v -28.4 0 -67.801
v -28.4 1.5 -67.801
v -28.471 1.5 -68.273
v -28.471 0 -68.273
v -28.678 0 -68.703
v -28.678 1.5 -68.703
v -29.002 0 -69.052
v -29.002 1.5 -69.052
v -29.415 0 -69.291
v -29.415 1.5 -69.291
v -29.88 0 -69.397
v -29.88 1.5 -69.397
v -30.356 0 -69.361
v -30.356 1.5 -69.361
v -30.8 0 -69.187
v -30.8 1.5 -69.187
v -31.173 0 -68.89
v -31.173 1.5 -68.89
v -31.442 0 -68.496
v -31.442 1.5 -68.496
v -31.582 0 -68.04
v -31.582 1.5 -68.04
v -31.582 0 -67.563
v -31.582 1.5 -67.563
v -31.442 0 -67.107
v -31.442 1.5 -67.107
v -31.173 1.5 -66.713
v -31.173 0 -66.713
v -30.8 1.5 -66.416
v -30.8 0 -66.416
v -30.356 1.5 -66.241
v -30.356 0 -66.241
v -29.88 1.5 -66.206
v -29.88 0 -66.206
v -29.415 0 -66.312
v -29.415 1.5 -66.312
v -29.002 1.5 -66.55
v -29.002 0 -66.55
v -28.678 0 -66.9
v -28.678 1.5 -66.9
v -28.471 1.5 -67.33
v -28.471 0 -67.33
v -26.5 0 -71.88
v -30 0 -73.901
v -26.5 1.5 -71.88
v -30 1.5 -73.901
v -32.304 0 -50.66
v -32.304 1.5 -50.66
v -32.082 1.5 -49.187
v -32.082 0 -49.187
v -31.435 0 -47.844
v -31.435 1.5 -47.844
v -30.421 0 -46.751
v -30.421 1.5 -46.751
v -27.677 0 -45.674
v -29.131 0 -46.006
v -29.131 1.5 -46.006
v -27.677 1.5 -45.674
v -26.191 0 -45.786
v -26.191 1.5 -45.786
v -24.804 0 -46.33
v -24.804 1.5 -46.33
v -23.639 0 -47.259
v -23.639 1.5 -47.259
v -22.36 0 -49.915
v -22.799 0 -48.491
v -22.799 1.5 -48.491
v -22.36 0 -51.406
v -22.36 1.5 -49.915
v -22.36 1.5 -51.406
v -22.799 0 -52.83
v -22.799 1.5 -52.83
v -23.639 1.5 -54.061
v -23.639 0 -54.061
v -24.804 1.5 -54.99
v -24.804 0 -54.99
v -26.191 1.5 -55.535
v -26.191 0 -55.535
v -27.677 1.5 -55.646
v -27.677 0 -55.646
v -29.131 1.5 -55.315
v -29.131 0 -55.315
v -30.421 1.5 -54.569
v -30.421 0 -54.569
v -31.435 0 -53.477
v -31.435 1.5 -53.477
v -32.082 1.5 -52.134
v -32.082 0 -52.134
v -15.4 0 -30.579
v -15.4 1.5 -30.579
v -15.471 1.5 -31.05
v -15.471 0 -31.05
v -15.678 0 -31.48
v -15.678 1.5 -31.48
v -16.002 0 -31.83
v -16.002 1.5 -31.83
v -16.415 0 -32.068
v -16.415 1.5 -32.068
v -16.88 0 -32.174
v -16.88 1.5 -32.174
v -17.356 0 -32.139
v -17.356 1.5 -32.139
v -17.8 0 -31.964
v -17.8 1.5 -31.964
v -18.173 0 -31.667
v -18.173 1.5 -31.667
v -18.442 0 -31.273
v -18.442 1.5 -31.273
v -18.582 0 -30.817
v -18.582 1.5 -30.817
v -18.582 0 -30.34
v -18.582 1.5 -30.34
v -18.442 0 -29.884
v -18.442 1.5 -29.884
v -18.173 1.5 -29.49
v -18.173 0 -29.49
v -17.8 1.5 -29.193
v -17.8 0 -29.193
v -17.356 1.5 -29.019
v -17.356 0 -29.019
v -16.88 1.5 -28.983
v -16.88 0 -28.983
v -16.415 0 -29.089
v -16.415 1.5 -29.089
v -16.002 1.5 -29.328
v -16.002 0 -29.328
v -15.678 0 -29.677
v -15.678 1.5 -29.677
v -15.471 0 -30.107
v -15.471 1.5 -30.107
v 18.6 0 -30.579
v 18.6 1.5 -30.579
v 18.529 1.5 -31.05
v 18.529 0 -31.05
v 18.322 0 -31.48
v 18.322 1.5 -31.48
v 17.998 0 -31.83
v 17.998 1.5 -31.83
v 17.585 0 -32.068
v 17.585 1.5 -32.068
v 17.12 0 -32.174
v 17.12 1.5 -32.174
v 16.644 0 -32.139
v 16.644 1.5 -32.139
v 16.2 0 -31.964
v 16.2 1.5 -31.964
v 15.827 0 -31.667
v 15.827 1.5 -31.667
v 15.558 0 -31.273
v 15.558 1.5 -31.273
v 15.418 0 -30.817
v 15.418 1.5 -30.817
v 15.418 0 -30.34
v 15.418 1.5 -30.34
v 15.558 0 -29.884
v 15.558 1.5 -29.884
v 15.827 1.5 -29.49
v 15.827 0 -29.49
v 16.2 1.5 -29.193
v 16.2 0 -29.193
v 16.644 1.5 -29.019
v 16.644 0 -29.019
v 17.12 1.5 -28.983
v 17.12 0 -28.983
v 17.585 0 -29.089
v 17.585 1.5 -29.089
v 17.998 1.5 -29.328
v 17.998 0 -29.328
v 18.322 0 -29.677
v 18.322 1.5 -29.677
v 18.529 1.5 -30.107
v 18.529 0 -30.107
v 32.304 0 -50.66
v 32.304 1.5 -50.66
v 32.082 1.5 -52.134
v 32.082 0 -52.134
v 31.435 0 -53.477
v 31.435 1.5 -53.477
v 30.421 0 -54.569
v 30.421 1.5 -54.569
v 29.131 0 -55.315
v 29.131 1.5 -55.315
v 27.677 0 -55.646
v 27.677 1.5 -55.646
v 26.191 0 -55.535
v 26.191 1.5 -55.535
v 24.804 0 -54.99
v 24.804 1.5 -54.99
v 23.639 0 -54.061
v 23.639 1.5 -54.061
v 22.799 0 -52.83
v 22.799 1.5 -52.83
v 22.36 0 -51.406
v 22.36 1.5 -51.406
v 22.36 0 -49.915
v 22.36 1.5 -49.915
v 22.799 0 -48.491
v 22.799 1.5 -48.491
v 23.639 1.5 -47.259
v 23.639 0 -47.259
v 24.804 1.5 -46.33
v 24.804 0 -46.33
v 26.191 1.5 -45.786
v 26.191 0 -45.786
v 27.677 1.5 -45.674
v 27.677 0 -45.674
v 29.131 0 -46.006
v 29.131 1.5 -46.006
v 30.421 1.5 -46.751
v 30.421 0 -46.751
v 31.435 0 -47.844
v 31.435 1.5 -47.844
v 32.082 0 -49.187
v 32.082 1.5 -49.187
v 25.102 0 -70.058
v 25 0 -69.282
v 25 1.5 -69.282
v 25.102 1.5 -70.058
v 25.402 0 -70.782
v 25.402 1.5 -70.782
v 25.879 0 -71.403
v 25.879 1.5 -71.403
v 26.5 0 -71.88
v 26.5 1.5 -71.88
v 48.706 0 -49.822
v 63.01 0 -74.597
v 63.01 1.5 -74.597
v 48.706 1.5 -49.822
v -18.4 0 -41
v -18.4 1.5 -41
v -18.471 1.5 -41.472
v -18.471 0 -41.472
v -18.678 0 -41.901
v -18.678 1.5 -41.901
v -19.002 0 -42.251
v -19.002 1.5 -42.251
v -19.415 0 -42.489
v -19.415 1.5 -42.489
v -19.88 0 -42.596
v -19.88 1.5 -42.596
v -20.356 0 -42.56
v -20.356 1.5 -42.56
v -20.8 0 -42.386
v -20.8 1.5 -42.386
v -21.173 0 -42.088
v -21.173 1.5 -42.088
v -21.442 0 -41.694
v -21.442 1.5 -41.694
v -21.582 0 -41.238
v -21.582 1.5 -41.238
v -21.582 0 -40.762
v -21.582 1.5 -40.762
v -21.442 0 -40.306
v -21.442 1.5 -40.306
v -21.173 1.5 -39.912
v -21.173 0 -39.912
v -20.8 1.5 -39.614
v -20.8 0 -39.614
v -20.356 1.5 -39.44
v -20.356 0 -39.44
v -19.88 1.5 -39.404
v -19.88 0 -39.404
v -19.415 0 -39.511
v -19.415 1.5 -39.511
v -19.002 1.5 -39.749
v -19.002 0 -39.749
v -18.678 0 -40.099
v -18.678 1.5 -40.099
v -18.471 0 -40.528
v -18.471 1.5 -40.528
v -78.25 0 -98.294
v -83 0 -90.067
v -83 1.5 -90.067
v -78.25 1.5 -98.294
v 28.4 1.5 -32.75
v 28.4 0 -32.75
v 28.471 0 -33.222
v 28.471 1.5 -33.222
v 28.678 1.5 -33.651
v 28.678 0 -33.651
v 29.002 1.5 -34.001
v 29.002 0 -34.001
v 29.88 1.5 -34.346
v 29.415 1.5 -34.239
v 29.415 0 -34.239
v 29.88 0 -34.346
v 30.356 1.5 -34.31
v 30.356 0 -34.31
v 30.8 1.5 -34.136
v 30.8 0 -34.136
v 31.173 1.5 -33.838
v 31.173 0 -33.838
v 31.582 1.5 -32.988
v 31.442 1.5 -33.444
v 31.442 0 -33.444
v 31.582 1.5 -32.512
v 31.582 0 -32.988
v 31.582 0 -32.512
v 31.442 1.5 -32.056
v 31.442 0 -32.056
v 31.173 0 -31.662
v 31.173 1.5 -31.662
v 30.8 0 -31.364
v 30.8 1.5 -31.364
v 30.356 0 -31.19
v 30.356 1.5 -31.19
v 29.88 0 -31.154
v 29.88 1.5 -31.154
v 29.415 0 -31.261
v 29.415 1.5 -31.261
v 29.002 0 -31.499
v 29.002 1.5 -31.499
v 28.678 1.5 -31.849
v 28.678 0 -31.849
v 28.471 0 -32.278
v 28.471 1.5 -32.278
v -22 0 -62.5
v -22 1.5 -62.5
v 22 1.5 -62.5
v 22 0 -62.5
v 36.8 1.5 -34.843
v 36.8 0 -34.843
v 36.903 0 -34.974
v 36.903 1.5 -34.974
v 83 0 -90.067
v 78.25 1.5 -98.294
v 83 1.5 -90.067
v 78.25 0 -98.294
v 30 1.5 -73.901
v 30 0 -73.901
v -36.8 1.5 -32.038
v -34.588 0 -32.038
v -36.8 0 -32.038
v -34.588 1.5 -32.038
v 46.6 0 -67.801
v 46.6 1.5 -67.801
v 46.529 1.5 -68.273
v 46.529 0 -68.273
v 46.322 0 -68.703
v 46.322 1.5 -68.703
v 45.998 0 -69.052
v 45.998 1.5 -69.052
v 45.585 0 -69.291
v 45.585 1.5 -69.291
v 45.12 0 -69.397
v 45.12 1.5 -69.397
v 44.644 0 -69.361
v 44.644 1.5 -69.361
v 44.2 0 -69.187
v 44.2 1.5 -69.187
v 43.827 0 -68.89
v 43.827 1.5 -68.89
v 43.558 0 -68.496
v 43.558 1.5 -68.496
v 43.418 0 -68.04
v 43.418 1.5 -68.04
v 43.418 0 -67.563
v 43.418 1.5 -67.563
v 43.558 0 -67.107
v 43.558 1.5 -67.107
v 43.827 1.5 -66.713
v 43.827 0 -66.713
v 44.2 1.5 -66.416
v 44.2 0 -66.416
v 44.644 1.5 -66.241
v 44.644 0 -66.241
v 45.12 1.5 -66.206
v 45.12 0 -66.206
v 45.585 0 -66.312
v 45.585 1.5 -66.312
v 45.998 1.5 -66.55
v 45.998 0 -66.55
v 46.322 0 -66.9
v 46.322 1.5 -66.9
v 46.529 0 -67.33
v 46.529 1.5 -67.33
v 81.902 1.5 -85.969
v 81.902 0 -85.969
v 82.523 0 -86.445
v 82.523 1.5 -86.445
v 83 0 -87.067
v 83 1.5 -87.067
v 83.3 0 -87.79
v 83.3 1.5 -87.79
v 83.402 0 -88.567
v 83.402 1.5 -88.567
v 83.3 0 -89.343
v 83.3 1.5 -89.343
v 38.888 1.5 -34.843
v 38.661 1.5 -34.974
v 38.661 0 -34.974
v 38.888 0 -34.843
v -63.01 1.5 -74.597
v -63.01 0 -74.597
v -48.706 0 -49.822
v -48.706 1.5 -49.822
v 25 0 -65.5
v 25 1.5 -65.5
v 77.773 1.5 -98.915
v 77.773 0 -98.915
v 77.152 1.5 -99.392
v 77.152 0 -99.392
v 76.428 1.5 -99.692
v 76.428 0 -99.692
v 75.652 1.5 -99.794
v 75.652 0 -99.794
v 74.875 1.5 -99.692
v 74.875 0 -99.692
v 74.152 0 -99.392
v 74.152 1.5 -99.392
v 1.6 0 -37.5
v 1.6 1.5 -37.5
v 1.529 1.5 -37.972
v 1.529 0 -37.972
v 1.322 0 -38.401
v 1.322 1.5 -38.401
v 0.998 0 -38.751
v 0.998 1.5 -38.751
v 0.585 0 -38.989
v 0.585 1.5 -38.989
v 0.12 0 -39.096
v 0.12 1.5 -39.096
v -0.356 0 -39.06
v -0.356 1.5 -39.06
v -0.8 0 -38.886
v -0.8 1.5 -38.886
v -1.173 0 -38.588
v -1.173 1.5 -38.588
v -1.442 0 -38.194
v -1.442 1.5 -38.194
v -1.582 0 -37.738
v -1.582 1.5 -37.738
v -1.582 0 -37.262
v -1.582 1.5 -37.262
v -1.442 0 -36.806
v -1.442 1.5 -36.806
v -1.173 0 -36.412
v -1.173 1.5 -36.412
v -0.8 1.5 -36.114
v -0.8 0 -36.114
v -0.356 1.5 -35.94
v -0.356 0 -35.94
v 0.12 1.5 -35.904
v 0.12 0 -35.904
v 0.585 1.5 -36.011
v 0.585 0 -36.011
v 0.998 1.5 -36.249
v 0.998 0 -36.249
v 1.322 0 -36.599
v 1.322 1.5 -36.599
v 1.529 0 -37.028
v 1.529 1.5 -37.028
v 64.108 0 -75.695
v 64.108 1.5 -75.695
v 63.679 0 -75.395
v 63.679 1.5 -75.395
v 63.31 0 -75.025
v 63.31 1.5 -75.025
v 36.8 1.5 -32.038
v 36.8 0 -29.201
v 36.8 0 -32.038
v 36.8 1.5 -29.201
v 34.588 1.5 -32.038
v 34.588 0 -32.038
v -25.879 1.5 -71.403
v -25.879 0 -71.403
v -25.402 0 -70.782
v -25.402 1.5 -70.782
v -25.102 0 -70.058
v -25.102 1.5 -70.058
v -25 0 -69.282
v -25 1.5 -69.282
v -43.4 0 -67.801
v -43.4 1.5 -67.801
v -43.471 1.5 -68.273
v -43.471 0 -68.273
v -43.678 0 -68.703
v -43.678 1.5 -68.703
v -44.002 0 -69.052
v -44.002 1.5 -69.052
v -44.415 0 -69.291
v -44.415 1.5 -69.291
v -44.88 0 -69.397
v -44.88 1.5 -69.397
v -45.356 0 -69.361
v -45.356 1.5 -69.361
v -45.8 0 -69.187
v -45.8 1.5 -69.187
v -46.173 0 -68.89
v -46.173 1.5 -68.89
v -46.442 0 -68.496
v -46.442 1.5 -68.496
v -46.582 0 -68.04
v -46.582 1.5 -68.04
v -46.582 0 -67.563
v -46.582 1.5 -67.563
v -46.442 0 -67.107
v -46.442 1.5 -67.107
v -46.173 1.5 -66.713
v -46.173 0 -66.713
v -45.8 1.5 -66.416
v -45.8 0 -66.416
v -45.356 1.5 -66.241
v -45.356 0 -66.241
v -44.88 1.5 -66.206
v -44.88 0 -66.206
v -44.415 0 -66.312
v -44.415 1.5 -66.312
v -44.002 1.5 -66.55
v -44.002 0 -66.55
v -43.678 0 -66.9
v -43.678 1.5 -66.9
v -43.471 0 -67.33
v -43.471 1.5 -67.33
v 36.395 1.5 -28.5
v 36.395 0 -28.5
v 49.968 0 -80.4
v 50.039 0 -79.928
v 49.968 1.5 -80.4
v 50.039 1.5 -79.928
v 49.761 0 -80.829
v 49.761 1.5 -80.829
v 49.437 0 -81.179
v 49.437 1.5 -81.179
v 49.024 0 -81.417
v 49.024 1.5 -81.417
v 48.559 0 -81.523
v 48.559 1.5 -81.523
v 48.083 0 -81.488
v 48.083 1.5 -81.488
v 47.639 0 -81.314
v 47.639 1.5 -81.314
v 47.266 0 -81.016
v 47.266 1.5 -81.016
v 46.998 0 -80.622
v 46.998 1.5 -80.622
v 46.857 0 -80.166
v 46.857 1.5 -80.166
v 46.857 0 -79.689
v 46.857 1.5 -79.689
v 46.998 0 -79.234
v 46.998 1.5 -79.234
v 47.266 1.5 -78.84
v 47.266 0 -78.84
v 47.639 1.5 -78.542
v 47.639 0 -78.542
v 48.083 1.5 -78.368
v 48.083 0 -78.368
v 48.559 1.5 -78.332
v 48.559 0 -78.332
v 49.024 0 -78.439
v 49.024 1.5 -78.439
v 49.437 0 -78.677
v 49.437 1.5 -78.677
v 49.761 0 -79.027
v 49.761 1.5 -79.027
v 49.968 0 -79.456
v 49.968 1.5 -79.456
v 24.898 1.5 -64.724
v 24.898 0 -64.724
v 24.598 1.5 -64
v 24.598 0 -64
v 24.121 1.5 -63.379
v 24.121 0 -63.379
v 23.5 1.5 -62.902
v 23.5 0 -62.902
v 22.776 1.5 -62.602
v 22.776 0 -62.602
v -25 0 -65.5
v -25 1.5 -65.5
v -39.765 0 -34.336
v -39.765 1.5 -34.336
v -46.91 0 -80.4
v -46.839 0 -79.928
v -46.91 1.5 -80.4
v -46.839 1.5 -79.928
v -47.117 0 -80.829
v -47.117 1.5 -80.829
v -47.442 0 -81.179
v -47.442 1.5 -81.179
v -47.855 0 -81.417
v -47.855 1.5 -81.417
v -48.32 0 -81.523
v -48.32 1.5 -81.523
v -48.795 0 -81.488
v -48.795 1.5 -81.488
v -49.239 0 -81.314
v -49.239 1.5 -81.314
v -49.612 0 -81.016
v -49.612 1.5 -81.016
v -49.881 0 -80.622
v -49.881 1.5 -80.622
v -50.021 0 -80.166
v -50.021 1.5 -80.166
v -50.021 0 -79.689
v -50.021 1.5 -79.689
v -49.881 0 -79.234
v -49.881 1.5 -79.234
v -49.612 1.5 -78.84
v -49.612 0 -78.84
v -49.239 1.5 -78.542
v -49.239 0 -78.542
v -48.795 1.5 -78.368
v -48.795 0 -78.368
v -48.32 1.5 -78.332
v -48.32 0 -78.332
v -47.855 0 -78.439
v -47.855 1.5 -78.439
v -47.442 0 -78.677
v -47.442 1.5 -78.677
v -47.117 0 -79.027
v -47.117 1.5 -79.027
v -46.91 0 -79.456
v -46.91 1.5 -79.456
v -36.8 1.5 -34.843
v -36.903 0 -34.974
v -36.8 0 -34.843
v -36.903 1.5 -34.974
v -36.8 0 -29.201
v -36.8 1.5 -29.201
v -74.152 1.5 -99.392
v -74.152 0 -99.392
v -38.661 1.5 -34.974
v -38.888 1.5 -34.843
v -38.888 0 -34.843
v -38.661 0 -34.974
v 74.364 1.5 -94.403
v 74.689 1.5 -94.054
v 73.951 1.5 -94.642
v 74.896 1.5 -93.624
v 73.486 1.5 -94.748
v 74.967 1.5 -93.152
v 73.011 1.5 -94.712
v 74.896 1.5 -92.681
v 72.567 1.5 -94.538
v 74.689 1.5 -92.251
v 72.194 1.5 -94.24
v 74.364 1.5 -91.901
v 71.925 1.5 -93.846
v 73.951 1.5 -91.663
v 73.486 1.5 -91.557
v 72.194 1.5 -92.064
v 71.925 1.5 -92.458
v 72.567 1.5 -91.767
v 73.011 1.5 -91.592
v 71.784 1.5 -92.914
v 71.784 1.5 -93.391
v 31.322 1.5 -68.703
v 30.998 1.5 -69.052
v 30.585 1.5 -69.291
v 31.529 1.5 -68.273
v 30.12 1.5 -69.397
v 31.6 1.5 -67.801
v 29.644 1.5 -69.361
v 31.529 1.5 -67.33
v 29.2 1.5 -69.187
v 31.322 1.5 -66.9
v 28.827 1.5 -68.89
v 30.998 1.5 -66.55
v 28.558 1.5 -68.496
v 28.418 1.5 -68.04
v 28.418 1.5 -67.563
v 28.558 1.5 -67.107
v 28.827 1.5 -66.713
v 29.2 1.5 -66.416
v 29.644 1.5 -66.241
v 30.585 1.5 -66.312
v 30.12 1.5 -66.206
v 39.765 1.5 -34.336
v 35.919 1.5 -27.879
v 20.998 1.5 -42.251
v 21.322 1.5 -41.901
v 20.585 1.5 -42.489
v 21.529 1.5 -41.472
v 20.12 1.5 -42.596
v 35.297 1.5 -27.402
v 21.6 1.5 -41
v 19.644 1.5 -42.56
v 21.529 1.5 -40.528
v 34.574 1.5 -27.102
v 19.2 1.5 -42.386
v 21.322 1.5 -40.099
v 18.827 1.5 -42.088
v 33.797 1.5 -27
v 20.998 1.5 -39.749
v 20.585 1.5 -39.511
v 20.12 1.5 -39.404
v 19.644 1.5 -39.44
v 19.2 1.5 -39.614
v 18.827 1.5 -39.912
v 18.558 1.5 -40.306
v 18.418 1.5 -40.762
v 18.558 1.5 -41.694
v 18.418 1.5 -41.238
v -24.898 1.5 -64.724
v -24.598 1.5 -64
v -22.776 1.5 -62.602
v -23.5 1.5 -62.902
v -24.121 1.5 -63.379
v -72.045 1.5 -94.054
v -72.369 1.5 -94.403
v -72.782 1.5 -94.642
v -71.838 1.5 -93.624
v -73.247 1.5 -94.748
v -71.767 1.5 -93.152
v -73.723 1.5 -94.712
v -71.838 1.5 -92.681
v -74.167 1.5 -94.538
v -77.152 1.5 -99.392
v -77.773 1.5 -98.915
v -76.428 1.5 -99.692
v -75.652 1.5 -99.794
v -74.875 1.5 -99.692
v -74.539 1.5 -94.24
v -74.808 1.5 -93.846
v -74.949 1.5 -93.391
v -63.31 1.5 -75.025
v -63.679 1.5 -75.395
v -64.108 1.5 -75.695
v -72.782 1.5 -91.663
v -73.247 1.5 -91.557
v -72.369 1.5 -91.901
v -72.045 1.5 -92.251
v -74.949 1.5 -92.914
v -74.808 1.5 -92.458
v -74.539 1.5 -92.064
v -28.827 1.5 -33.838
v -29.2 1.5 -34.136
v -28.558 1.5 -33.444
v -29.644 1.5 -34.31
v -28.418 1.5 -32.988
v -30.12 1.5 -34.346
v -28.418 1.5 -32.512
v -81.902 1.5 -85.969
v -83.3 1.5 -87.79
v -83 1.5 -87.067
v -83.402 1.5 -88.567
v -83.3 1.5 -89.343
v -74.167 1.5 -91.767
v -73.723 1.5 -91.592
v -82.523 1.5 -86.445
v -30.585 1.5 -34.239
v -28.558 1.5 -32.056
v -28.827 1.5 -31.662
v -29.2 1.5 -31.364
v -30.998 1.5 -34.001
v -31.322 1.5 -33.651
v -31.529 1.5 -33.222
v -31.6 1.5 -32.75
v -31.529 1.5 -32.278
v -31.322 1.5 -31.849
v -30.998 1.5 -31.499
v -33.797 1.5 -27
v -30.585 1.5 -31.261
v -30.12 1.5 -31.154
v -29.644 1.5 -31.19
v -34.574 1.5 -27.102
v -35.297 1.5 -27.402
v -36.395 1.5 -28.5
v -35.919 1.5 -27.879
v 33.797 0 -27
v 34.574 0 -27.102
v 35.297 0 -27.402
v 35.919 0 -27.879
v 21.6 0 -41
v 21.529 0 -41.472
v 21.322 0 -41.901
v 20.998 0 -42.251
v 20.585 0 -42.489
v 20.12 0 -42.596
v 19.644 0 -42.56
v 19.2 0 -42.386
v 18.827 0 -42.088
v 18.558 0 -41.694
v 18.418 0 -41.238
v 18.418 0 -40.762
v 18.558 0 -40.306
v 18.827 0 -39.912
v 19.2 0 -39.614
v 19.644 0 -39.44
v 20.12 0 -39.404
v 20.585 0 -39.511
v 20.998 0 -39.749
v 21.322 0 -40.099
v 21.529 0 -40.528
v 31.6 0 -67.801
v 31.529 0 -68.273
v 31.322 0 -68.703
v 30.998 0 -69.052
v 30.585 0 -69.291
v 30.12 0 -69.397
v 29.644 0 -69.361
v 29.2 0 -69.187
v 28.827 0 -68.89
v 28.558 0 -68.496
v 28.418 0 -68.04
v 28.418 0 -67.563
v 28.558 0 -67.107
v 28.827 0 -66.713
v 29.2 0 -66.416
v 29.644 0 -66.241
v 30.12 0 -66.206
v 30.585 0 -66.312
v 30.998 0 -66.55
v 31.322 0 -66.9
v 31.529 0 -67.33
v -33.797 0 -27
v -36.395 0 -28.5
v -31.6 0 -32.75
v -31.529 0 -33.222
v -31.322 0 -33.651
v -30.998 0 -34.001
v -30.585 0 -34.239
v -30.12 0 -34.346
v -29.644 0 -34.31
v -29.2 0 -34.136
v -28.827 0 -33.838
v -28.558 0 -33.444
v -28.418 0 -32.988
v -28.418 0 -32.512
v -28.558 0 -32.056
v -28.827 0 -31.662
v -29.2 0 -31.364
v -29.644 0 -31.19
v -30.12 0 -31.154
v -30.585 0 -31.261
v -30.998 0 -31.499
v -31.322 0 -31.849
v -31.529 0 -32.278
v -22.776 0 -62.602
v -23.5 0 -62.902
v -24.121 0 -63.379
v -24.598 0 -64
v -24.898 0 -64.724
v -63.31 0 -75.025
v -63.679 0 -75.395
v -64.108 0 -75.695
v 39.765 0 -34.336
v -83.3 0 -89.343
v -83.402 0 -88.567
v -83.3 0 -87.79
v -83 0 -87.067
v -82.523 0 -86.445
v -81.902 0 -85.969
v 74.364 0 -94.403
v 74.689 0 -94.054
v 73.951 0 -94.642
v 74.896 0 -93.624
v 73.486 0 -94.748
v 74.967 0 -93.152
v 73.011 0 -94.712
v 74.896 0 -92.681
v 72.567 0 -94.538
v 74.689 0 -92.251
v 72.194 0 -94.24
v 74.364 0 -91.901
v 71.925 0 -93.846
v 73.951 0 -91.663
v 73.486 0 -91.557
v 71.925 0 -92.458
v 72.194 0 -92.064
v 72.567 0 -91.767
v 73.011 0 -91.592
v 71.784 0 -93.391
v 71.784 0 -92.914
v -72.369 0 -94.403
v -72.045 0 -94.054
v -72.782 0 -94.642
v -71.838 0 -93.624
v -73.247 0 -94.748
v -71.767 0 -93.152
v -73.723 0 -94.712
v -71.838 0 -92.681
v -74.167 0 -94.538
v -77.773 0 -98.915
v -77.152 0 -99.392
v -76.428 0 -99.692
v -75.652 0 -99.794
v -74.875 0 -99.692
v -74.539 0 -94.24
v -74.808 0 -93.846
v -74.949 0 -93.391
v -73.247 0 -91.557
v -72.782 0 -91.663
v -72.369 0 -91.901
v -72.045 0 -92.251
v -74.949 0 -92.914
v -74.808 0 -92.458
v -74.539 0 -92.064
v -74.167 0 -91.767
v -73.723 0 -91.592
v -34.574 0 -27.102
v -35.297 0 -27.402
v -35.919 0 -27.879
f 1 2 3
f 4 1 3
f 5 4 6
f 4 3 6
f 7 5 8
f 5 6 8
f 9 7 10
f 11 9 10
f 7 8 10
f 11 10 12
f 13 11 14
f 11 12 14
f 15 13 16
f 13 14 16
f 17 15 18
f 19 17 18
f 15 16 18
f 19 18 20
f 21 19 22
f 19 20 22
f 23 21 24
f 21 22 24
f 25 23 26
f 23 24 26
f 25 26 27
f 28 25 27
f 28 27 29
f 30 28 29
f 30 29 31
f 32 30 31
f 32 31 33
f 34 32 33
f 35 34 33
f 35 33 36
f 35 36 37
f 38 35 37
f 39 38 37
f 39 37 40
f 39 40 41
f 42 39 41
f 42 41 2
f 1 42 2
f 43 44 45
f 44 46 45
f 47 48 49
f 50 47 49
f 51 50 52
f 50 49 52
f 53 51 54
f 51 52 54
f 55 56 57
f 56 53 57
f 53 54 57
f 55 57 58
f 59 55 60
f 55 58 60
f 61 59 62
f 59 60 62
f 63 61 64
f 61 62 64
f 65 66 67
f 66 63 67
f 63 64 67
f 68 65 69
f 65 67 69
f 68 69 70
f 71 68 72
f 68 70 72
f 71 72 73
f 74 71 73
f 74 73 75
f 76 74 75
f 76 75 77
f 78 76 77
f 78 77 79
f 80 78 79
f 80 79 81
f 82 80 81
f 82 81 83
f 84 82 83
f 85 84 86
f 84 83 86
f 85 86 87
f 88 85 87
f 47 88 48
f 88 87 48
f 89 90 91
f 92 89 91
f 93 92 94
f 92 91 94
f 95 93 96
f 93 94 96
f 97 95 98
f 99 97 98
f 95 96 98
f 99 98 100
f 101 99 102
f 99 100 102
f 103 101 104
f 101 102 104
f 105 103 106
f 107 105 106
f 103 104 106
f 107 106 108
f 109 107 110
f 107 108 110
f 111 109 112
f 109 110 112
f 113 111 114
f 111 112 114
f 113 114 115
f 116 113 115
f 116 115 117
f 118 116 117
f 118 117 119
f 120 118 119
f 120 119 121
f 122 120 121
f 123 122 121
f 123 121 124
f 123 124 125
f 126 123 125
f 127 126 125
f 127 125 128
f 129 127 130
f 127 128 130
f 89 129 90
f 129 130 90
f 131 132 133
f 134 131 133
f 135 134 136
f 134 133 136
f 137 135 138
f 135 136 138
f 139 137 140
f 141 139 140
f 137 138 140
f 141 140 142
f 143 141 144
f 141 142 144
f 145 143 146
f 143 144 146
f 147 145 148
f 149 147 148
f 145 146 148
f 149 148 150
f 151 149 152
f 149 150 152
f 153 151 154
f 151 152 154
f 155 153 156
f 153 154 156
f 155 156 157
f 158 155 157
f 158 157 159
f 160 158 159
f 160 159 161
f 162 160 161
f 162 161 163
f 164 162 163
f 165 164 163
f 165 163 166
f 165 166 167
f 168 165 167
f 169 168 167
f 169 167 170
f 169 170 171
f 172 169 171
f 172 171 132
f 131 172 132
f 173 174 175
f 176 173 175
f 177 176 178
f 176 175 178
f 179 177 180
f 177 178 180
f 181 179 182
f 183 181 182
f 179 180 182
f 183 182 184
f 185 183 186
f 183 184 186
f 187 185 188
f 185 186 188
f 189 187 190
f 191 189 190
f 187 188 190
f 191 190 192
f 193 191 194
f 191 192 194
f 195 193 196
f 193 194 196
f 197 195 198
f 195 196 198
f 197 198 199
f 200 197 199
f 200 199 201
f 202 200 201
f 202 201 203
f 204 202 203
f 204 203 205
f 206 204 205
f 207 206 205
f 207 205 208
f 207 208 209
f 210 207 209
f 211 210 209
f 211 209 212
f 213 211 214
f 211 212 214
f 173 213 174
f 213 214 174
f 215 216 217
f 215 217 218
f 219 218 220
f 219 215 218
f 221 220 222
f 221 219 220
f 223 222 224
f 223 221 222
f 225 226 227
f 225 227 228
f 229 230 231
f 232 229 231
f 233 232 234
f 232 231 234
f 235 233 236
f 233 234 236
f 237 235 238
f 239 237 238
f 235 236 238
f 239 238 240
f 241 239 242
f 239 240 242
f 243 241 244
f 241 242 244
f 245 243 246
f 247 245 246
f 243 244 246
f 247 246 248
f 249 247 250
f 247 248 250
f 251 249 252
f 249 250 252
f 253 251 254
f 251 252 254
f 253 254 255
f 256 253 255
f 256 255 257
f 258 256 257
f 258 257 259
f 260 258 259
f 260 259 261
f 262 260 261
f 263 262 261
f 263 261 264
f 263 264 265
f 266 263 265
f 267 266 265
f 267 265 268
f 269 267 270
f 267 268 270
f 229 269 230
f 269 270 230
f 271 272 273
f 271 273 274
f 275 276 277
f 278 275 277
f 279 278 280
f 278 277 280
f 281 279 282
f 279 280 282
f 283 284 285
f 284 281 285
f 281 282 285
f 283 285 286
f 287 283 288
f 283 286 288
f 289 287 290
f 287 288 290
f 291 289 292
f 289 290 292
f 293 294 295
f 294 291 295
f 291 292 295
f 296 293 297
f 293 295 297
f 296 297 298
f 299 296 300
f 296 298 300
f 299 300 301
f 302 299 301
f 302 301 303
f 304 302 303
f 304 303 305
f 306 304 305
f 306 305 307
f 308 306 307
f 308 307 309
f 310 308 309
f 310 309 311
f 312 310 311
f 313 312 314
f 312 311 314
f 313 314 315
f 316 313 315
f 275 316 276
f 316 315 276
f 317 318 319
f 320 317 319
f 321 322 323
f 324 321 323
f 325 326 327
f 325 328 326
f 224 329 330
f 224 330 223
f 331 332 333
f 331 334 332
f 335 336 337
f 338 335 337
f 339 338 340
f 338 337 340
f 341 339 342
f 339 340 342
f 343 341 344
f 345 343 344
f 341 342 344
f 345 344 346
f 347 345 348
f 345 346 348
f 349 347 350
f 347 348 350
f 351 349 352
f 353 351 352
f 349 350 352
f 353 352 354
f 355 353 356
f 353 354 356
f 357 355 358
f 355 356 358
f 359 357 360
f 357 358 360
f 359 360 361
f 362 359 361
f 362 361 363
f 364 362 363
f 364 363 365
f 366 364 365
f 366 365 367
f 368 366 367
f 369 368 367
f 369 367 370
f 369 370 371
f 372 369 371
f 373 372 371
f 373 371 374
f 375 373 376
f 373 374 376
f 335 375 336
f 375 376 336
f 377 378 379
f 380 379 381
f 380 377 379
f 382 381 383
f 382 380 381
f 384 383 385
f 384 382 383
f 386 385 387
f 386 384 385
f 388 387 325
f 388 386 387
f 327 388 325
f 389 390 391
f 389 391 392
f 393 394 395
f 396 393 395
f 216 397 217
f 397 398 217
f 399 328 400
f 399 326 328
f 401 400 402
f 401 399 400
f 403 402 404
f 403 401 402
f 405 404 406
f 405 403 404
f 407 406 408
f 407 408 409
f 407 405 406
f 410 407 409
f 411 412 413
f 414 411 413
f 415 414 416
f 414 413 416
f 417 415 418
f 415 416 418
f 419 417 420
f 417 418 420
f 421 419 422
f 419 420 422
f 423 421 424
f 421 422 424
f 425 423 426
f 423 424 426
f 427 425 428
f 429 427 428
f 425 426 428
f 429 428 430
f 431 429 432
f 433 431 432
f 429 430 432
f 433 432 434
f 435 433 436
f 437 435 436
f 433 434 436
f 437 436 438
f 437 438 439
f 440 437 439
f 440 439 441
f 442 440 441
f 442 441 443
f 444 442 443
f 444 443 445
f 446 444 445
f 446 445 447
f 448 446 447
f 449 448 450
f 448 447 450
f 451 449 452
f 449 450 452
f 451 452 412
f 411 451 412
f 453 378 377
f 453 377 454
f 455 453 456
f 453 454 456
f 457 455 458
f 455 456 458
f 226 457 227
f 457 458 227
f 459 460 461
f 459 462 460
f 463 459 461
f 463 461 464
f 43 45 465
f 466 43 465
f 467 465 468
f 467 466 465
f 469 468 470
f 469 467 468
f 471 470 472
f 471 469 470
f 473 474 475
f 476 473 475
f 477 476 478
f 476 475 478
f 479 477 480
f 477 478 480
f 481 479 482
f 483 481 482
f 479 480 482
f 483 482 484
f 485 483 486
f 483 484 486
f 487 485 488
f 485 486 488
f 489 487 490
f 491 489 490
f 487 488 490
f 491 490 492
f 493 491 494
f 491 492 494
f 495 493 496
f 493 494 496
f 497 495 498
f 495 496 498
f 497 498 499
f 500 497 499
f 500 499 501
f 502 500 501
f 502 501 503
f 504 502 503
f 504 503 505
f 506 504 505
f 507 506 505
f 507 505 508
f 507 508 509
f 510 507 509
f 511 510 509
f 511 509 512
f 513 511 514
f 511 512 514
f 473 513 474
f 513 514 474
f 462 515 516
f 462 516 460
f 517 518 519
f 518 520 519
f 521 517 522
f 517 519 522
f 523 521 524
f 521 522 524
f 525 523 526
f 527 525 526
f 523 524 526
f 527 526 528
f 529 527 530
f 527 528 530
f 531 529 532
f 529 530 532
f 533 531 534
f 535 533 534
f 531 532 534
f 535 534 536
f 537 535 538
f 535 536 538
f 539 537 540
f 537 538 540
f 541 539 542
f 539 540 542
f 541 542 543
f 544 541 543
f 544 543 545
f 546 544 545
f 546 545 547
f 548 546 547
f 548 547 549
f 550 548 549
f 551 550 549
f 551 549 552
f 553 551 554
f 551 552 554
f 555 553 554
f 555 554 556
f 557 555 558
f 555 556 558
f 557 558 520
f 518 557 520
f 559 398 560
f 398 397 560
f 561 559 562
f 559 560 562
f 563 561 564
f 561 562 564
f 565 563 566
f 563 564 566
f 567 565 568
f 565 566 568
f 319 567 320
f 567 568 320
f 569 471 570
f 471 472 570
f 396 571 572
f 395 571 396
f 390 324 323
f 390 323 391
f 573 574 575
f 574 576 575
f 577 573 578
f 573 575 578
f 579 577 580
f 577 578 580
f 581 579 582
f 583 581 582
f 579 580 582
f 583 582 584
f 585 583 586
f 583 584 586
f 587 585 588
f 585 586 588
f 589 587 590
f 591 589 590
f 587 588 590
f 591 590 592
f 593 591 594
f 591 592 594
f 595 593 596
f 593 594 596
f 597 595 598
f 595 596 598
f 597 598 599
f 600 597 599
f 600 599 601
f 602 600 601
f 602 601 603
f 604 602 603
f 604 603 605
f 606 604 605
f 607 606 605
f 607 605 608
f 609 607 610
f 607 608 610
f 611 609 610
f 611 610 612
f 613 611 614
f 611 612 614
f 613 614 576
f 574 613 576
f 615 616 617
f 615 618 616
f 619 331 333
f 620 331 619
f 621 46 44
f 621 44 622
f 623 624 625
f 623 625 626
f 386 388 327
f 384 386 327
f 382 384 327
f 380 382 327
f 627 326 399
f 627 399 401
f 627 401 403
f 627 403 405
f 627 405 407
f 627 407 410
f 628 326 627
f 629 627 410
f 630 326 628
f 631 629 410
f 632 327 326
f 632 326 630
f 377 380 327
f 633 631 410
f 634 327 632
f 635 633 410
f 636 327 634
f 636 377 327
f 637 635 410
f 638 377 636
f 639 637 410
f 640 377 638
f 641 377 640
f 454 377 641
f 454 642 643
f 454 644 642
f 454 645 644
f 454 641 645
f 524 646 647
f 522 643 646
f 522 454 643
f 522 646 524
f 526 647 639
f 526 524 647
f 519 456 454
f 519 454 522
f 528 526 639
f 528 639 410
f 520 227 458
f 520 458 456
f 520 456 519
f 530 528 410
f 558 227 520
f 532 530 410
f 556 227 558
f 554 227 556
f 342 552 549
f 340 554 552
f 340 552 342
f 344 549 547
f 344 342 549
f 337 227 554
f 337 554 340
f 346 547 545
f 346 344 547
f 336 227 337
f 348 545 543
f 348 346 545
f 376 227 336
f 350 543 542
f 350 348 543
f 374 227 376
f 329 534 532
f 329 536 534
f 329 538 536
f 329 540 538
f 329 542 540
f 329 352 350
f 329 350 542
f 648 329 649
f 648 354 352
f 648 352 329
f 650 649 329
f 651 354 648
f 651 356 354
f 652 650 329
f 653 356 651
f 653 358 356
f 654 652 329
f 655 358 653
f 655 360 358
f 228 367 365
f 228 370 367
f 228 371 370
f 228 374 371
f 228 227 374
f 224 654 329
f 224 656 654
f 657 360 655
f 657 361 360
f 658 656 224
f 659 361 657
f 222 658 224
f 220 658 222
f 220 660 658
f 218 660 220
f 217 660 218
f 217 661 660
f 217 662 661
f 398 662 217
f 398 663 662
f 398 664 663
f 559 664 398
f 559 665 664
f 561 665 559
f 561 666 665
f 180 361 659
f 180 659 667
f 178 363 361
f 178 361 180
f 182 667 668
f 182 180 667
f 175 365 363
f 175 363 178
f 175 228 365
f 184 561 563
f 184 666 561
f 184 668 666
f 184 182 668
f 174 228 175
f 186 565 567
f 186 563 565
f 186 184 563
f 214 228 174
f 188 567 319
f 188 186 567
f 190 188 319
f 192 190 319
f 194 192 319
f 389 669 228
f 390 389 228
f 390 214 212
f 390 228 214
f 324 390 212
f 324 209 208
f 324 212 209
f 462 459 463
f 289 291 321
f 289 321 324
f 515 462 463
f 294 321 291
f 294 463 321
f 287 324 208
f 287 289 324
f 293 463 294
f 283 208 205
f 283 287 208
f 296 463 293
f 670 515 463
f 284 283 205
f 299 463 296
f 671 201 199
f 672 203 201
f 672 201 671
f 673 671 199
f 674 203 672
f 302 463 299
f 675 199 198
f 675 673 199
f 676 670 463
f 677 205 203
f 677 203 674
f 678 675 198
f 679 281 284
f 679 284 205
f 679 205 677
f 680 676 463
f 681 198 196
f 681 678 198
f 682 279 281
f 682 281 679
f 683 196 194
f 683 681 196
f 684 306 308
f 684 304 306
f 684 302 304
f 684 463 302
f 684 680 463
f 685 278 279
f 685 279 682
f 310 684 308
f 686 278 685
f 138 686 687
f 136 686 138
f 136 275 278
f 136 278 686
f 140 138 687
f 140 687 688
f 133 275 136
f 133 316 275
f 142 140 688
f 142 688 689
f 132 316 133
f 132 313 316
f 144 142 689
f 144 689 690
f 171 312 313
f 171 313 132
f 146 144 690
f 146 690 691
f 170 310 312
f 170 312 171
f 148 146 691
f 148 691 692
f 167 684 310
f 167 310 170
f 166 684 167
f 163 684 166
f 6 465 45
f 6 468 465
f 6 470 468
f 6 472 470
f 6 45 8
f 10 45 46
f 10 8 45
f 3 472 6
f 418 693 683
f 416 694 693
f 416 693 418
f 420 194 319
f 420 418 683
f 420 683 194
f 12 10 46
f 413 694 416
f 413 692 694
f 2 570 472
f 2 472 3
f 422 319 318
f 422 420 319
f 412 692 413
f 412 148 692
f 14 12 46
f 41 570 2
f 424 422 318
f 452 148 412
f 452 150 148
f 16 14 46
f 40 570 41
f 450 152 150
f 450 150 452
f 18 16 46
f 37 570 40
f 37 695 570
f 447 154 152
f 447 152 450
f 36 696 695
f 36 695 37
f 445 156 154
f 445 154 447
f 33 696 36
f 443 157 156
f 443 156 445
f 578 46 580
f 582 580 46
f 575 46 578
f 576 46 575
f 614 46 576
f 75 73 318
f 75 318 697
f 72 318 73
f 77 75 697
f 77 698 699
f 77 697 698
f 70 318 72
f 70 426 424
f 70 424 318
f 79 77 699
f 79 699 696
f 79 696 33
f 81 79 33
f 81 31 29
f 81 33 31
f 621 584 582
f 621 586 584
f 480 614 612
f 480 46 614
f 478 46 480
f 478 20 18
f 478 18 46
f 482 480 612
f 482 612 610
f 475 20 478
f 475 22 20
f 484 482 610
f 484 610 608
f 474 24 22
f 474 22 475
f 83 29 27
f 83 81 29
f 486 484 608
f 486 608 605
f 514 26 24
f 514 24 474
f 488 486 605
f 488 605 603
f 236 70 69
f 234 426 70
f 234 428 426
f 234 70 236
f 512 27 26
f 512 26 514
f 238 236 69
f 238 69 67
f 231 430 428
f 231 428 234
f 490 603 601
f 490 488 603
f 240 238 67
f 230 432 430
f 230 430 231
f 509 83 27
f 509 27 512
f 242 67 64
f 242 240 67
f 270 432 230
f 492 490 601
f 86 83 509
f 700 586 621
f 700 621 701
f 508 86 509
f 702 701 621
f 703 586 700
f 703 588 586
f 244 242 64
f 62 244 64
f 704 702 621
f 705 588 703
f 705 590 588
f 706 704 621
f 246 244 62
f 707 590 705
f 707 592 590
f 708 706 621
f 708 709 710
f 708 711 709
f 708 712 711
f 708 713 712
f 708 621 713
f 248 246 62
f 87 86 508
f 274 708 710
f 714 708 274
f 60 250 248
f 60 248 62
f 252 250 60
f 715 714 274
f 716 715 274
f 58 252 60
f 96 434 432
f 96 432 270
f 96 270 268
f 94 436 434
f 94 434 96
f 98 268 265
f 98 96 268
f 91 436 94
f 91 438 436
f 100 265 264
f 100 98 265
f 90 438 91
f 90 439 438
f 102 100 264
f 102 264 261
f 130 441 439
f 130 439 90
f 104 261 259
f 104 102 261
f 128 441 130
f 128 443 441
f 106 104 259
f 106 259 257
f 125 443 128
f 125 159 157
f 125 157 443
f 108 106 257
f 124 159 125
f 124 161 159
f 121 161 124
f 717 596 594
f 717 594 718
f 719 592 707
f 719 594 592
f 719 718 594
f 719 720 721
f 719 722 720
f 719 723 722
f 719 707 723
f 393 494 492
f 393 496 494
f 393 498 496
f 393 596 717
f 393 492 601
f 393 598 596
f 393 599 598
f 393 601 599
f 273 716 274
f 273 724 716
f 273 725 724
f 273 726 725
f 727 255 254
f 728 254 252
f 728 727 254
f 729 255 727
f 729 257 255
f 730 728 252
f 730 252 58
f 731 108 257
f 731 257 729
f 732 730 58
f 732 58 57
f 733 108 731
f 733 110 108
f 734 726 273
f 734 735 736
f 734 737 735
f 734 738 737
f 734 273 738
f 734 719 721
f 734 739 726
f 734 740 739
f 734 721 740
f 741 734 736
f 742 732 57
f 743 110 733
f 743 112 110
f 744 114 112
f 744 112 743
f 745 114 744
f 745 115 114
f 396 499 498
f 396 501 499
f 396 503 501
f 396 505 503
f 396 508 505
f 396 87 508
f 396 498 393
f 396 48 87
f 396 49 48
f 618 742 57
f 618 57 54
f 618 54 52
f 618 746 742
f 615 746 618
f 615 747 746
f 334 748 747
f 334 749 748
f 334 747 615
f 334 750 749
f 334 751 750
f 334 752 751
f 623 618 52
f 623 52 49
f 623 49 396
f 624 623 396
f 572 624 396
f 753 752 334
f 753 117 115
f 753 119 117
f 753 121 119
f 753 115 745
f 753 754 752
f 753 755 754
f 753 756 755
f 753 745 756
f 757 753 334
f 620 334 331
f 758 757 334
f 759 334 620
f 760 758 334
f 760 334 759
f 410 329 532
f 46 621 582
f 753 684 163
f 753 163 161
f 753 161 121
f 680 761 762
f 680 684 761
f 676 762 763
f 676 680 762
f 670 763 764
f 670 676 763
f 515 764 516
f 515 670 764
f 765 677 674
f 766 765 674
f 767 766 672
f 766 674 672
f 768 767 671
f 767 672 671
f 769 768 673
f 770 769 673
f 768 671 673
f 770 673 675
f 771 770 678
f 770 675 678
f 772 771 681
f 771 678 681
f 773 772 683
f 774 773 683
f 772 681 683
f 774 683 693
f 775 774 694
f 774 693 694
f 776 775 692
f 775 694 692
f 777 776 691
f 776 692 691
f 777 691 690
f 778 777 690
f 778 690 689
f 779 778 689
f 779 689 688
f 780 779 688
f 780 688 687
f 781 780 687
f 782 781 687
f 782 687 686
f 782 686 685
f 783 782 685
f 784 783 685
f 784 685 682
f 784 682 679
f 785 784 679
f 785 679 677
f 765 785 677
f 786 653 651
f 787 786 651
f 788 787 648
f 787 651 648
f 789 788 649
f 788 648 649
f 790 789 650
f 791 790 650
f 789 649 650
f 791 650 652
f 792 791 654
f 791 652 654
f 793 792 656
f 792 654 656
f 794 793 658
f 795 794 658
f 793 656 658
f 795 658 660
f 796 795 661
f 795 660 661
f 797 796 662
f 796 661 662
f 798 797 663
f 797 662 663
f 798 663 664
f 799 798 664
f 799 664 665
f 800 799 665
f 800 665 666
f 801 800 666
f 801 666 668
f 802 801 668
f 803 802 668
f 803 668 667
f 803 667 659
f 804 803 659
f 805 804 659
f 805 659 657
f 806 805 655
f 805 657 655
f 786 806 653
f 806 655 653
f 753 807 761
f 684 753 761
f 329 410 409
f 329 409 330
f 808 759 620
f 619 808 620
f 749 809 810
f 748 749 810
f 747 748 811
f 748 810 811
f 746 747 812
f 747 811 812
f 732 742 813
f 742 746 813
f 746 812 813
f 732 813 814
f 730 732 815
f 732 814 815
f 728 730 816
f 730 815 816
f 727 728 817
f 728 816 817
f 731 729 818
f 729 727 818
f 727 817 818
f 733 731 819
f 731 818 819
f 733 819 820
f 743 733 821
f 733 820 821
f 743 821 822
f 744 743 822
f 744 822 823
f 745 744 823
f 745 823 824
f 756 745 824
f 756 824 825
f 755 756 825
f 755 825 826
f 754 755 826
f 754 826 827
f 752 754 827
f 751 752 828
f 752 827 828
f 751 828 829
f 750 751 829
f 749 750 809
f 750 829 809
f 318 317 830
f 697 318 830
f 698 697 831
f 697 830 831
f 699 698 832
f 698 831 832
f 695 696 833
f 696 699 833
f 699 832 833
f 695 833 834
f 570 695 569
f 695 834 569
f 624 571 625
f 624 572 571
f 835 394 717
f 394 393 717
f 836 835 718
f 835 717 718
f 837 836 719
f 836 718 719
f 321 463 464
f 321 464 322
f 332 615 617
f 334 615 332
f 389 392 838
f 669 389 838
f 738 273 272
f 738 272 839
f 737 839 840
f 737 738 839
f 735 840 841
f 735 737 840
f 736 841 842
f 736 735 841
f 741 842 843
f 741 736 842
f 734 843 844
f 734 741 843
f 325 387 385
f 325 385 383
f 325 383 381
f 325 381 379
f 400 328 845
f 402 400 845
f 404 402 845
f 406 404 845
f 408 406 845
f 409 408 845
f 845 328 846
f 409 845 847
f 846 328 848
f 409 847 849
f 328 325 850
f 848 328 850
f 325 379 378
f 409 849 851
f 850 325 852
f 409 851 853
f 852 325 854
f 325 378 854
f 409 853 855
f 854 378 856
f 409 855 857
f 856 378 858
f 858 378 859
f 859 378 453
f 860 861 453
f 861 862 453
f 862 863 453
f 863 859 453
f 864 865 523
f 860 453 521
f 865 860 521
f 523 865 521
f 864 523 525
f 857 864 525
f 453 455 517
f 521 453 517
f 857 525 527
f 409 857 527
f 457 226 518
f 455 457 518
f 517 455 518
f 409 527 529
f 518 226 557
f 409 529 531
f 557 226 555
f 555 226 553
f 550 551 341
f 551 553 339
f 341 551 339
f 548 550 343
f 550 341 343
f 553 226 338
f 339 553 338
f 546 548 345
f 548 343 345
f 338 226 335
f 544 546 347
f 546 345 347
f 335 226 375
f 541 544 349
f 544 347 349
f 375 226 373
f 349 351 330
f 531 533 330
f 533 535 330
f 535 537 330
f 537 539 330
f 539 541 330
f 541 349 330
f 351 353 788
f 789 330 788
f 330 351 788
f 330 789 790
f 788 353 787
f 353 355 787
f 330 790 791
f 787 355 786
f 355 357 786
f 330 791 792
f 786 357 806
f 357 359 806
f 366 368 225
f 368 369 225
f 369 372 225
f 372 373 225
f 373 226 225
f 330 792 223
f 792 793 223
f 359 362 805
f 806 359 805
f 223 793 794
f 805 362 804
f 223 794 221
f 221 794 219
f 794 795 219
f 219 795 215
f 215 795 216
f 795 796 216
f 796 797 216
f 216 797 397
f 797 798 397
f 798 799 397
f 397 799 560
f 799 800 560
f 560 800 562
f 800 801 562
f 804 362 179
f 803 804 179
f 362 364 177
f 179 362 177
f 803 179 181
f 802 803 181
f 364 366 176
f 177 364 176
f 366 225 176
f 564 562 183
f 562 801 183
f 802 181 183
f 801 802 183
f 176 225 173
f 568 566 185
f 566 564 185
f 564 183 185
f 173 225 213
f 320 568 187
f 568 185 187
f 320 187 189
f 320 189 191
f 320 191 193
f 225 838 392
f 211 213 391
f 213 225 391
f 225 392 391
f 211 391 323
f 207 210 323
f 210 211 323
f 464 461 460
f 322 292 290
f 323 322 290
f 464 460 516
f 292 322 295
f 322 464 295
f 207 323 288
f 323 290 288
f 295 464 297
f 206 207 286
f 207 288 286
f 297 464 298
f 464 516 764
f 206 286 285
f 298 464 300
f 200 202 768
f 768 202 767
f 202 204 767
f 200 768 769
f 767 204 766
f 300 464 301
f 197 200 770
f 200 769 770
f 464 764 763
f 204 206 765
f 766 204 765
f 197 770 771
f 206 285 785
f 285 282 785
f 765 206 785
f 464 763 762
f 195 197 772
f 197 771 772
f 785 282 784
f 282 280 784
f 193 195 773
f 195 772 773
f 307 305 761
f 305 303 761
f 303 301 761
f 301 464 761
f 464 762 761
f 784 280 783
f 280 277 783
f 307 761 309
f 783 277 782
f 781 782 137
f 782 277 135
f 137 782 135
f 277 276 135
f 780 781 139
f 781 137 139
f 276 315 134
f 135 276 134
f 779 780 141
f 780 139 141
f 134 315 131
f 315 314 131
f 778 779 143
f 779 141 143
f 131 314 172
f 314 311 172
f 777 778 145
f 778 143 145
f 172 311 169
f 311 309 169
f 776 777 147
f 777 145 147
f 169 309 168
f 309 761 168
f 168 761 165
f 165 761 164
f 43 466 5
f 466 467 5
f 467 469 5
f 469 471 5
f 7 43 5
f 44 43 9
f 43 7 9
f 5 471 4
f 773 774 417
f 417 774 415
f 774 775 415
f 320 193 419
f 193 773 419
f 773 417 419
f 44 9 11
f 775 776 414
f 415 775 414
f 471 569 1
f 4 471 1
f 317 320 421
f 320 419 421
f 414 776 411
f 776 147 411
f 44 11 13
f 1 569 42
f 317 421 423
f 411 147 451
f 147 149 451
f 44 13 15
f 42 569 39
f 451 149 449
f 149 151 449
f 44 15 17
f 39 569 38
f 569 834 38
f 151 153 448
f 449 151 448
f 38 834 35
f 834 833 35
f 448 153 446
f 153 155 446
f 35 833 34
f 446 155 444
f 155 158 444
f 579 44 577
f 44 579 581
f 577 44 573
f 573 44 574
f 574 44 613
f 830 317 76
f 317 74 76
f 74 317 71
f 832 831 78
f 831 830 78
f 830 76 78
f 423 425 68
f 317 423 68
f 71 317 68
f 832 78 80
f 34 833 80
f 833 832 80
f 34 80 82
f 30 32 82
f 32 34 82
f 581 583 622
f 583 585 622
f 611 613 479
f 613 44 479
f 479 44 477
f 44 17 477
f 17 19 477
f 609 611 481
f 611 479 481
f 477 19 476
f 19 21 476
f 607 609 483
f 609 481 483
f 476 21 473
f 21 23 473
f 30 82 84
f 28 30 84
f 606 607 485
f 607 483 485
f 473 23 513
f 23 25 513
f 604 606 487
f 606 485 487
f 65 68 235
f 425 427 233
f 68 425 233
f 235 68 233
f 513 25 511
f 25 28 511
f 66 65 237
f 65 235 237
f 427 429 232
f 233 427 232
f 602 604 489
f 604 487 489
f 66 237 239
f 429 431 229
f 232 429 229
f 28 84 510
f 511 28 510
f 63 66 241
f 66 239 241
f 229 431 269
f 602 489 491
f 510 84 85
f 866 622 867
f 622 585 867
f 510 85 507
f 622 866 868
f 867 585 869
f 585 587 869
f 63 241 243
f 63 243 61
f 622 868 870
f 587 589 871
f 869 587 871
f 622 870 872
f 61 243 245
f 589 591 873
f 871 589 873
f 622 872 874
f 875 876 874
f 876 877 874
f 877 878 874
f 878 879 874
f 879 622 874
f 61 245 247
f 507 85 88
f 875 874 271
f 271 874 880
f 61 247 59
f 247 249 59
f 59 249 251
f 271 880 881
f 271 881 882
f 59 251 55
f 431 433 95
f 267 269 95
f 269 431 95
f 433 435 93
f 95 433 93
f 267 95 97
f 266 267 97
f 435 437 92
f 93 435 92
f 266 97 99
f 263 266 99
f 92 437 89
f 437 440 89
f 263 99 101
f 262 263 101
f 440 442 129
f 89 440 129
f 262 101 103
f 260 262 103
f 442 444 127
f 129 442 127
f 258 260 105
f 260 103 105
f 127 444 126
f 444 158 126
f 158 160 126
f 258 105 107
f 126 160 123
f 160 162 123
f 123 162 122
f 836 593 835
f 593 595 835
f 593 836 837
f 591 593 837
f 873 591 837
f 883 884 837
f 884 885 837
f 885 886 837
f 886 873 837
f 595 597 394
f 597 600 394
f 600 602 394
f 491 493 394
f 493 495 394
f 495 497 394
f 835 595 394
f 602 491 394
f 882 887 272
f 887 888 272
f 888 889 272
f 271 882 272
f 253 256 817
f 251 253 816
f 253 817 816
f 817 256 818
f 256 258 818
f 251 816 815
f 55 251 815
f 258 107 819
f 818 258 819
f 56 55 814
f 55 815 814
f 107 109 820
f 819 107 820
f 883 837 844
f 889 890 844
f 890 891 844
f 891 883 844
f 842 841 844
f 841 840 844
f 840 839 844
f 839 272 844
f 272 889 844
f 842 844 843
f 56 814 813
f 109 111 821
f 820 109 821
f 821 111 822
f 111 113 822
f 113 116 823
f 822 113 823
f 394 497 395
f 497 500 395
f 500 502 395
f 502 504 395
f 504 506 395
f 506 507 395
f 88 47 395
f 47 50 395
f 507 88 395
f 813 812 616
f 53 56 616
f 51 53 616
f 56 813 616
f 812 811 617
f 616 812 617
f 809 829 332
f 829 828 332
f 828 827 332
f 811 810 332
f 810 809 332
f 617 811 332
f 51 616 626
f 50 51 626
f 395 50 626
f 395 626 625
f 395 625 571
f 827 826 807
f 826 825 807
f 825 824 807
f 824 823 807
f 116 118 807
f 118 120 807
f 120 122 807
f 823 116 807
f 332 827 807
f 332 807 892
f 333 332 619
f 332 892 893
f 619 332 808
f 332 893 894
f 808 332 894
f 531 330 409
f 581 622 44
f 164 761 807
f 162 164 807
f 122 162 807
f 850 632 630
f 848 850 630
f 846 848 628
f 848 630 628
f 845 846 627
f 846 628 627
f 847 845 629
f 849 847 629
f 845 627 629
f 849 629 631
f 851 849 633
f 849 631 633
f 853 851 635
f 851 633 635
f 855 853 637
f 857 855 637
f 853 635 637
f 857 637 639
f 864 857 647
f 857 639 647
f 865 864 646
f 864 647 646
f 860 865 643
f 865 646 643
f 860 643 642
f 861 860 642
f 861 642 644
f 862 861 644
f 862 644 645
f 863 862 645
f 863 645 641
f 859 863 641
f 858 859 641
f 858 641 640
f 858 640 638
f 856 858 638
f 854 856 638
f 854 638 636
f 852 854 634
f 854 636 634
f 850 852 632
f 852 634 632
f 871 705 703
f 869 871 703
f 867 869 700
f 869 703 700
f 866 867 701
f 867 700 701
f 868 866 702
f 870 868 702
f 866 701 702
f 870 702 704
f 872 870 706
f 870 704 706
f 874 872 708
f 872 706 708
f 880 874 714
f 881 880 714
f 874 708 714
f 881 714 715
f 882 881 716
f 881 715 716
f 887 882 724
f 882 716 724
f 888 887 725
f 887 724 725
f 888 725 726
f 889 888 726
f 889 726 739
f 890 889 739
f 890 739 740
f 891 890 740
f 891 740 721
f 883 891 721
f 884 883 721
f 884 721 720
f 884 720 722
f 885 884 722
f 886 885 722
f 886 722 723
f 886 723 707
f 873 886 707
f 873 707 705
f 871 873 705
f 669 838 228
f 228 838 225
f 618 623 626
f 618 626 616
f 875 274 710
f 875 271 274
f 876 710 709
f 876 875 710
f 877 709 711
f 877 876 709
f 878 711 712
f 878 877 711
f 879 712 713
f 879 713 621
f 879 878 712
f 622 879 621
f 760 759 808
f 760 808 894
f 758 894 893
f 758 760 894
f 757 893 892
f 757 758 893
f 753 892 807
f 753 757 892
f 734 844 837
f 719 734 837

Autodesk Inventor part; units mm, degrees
ref_plane "YZ Plane" through (0, 0, 0) normal (1, 0, 0) x (0, 1, 0)
ref_plane "XZ Plane" through (0, 0, 0) normal (0, 1, 0) x (-1, 0, 0)
ref_plane "XY Plane" through (0, 0, 0) normal (0, 0, 1) x (1, 0, 0)
sketch "スケッチ1" plane through (0, 0, 0) normal (0, 1, 0) x (-1, 0, 0)
  line L0 (75, 0) -> (105, -51.9615)
  line L1 (-75, 0) -> (-105, -51.9615)
  line L2 (0, -218.2384) -> (0, 36.3731)
  line L3 (147, 0) -> (-147, 0)
  line L4 (105, -51.9615) -> (30, -181.8653)
  line L5 (30, -181.8653) -> (-30, -181.8653)
  line L6 (-30, -181.8653) -> (-105, -51.9615)
  line L7 (75, 0) -> (-75, 0)
  line L8 (34, 0) -> (34, -24.3509)
  line L9 (34, -24.3509) -> (48.7058, -49.822)
  line L10 (48.7058, -49.822) -> (90, -25.9808)
  line L11 (45, 0) -> (45, -18) construction
  line L12 (45, -18) -> (34, -24.3509) construction
  line L13 (84.5, -87.4686) -> (63.4115, -75.2931)
  line L14 (63.4115, -75.2931) -> (48.7058, -49.822)
  line L15 (-34, 0) -> (-34, -24.3509)
  line L16 (-34, -24.3509) -> (-48.7058, -49.822)
  line L17 (-63.4115, -75.2931) -> (-48.7058, -49.822)
  line L18 (-84.5, -87.4686) -> (-63.4115, -75.2931)
  circle A0 centre (30, -32.75) radius 1.6
  circle A1 centre (-30, -32.75) radius 1.6
  line L19 (35.5295, -27) -> (-35.5295, -27)
  point P0 (0, 0)
  point P1 (0, 0)
  point P2 (0, -27)
  dimension "d1" = 150
  dimension "d2" = 60
  dimension "d3" = 60
  dimension "d6" = 60
  dimension "d30" = 60
  dimension "d31" = 18
  dimension "d32" = 30
  dimension "d33" = 41
  dimension "d34" = 3.2
  dimension "d35" = 30
  dimension "d36" = 32.75
  dimension "d37" = 27
extrude "プレート1" add sketch "スケッチ1" along normal blind 1.5 contours L14 L13 L4 L5 L2 L19 L9 | L2 L5 L6 L18 L17 L16 L19
sketch "スケッチ4" plane through (0, 1.5, 0) normal (0, 1, 0) x (1, 0, 0)
  circle A0 centre (30, 67.8013) radius 1.6
  circle A1 centre (45, 67.8013) radius 1.6
  line L0 (0, 218.2384) -> (0, -36.3731)
  circle A2 centre (-30, 67.8013) radius 1.6
  circle A3 centre (-45, 67.8013) radius 1.6
  line L1 (61.6173, 73.1025) -> (25, 73.1025) construction
  line L2 (25, 73.1025) -> (25, 62.5) construction
  line L3 (-61.6173, 73.1025) -> (-25, 73.1025) construction
  line L4 (-25, 73.1025) -> (-25, 62.5) construction
  line L5 (-25, 62.5) -> (25, 62.5)
  line L6 (30, 73.1025) -> (30, 181.8653)
  line L7 (30, 181.8653) -> (-30, 181.8653)
  line L8 (-30, 181.8653) -> (-30, 73.1025)
  line L9 (-25, 62.5) -> (25, 62.5)
  line L10 (25, 62.5) -> (25, 71.0141)
  line L11 (-25, 71.0141) -> (-25, 62.5)
  line L12 (30, 181.8653) -> (84.5, 87.4686)
  line L13 (76.75, 100.892) -> (30, 73.9008)
  line L14 (-30, 73.9008) -> (-76.75, 100.892)
  line L15 (-84.5, 87.4686) -> (-30, 181.8653)
  line L16 (84.5, 87.4686) -> (63.4115, 75.2931)
  line L17 (-63.4115, 75.2931) -> (-84.5, 87.4686)
  line L18 (-35.5295, 27) -> (-63.4115, 75.2931)
  line L19 (62.8673, 70.9375) -> (54.6673, 85.1403)
  arc A4 (54.6673, 85.1403) -> (44.275, 79.1403) centre (49.4712, 82.1403) ccw
  line L20 (44.275, 79.1403) -> (52.475, 64.9375)
  line L21 (52.475, 64.9375) -> (62.8673, 70.9375)
  line L22 (51.2321, 85.1903) -> (52.993, 82.1403)
  line L23 (52.993, 82.1403) -> (51.2321, 79.0903)
  line L24 (51.2321, 79.0903) -> (47.7102, 79.0903)
  line L25 (47.7102, 79.0903) -> (45.9493, 82.1403)
  line L26 (45.9493, 82.1403) -> (47.7102, 85.1903)
  line L27 (47.7102, 85.1903) -> (51.2321, 85.1903)
  line L28 (-30, 73.9008) -> (-25, 71.0141)
  line L29 (30, 73.9008) -> (25, 71.0141)
  point P0 (0, 0)
extrude "切り取り3" cut sketch "スケッチ4" against normal blind 1.5 contours A0 | A1 | L7 L6 L29 L10 L5 L0 | L0 L5 L11 L28 L8 L7 | L12 L13 A4 L6 | L8 L14 L15 | A4 L13 L27 L26 | L26 L27 L13 | A2 | A3
sketch "スケッチ5" plane through (0, 1.5, 0) normal (0, 1, 0) x (1, 0, 0)
  line L0 (-75, 44) -> (75, 44) projected
  circle A0 centre (-20, 41) radius 3
  circle A1 centre (20, 41) radius 3
  line L1 (-25, 62.5) -> (25, 62.5) projected
  line L2 (0, 62.5) -> (0, 27)
  line L3 (35.5295, 27) -> (-35.5295, 27) projected
  circle A2 centre (-20, 41) radius 1.6
  circle A3 centre (20, 41) radius 1.6
  circle A4 centre (0, 37.5) radius 1.6
  point P0 (0, 0)
  dimension "d41" = 6
  dimension "d42" = 6
  dimension "d43" = 40
  dimension "d44" = 3.2
  dimension "d45" = 3.2
  dimension "d46" = 3.2
  dimension "d47" = 3.5
extrude "切り取り4" cut sketch "スケッチ5" against normal blind 1.5 contours A4 L2 | L2 A4 | A2 | A3
sketch "スケッチ6" plane through (0, 1.5, 0) normal (0, 1, 0) x (1, 0, 0)
  ellipse E0 centre (-73.3666, 93.1522) end of major axis (-72.2841, 92.5272) minor radius 1.2133 projected
  circle A0 centre (-48.4391, 79.9279) radius 1.6
  circle A1 centre (-73.3666, 93.1522) radius 1.6
  line L0 (0, 0) -> (0, 20.4537)
  circle A2 centre (48.4391, 79.9279) radius 1.6
  circle A3 centre (73.3666, 93.1522) radius 1.6
  circle A4 centre (-48.4391, 79.9279) radius 1.35 projected
  dimension "d51" = 3.2
  dimension "d52" = 3.2
extrude "切り取り5" cut sketch "スケッチ6" against normal blind 1.5 contours E0 | A0 | A1 | A2 | A3 | A4
fillet "フィレット2" radius 3 12 edges at (-84.5, 0.75, -87.4686) (-76.75, 0.75, -100.892) (-63.4115, 0.75, -75.2931) (-35.5295, 0.75, -27) (35.5295, 0.75, -27) (63.4115, 0.75, -75.2931) (84.5, 0.75, -87.4686) (76.75, 0.75, -100.892) (25, 0.75, -62.5) (-25, 0.75, -62.5) (-25, 0.75, -71.0141) (25, 0.75, -71.0141)
sketch "スケッチ7" plane through (0, 1.5, 0) normal (0, 1, 0) x (1, 0, 0)
  circle A0 centre (-17, 30.5787) radius 1.6
  circle A1 centre (17, 30.5787) radius 1.6
  point P0 (0, 0)
extrude "切り取り6" cut sketch "スケッチ7" against normal blind 1.5
sketch "スケッチ8" plane through (0, 1.5, 0) normal (0, 1, 0) x (1, 0, 0)
  line L0 (37, 32.2376) -> (37, 27.2376) construction
  line L1 (35, 32.2376) -> (37, 32.2376) construction
  line L2 (37, 34.7735) -> (35, 32.2376) construction
  line L3 (38.6077, 34.7735) -> (37, 34.7735) construction
  line L4 (40.6651, 33.5857) -> (38.6077, 34.7735) construction
  line L5 (63.0096, 74.597) -> (36.3955, 28.5) projected
  line L6 (36.8, 29.2006) -> (36.8, 32.0376)
  line L7 (36.8, 32.0376) -> (34.5875, 32.0376)
  line L8 (34.5875, 32.0376) -> (36.8, 34.8429)
  line L9 (38.8875, 34.8429) -> (39.7651, 34.3362)
  line L10 (36.8, 34.8429) -> (36.903, 34.9735)
  line L11 (36.903, 34.9735) -> (38.6613, 34.9735)
  line L12 (38.6613, 34.9735) -> (38.8876, 34.8428)
  line L13 (39.7651, 34.3362) -> (36.8, 29.2006)
  point P0 (0, 0)
  dimension "d58" = 0.2
  dimension "d59" = 0.2
  dimension "d60" = 0.2
  dimension "d61" = 0.2
  dimension "d62" = 0.2
extrude "押し出し1" cut sketch "スケッチ8" against normal through all
mirror "ミラー1" about plane through (0, 0, 0) normal (1, 0, 0) of "押し出し1"
sketch "スケッチ9" plane through (0, 1.5, 0) normal (0, 1, 0) x (1, 0, 0)
  circle A0 centre (27.3038, 50.6603) radius 1.6
  circle A1 centre (27.3038, 50.6603) radius 5
  point P0 (0, 0)
  dimension "d65" = 10
extrude "切り取り7" cut sketch "スケッチ9" against normal blind 1.5 contours A0 | A1
mirror "ミラー2" about plane through (0, 0, 0) normal (1, 0, 0) of "切り取り7"
equation "\"d3\" = d2"
equation "\"d38\" = Thickness"
equation "\"d41\" = d42"
equation "\"d48\" = Thickness"
equation "\"d53\" = Thickness"
equation "\"d56\" = Thickness"
equation "\"d58\" = d61"
equation "\"d59\" = d61"
equation "\"d60\" = d61"
equation "\"d62\" = d61"
equation "\"d66\" = Thickness"
equation "\"d16\" = Thickness"
equation "\"Thickness\" = 1.5"
properties part number "upper_plate" material "アルミニウム 6061"
